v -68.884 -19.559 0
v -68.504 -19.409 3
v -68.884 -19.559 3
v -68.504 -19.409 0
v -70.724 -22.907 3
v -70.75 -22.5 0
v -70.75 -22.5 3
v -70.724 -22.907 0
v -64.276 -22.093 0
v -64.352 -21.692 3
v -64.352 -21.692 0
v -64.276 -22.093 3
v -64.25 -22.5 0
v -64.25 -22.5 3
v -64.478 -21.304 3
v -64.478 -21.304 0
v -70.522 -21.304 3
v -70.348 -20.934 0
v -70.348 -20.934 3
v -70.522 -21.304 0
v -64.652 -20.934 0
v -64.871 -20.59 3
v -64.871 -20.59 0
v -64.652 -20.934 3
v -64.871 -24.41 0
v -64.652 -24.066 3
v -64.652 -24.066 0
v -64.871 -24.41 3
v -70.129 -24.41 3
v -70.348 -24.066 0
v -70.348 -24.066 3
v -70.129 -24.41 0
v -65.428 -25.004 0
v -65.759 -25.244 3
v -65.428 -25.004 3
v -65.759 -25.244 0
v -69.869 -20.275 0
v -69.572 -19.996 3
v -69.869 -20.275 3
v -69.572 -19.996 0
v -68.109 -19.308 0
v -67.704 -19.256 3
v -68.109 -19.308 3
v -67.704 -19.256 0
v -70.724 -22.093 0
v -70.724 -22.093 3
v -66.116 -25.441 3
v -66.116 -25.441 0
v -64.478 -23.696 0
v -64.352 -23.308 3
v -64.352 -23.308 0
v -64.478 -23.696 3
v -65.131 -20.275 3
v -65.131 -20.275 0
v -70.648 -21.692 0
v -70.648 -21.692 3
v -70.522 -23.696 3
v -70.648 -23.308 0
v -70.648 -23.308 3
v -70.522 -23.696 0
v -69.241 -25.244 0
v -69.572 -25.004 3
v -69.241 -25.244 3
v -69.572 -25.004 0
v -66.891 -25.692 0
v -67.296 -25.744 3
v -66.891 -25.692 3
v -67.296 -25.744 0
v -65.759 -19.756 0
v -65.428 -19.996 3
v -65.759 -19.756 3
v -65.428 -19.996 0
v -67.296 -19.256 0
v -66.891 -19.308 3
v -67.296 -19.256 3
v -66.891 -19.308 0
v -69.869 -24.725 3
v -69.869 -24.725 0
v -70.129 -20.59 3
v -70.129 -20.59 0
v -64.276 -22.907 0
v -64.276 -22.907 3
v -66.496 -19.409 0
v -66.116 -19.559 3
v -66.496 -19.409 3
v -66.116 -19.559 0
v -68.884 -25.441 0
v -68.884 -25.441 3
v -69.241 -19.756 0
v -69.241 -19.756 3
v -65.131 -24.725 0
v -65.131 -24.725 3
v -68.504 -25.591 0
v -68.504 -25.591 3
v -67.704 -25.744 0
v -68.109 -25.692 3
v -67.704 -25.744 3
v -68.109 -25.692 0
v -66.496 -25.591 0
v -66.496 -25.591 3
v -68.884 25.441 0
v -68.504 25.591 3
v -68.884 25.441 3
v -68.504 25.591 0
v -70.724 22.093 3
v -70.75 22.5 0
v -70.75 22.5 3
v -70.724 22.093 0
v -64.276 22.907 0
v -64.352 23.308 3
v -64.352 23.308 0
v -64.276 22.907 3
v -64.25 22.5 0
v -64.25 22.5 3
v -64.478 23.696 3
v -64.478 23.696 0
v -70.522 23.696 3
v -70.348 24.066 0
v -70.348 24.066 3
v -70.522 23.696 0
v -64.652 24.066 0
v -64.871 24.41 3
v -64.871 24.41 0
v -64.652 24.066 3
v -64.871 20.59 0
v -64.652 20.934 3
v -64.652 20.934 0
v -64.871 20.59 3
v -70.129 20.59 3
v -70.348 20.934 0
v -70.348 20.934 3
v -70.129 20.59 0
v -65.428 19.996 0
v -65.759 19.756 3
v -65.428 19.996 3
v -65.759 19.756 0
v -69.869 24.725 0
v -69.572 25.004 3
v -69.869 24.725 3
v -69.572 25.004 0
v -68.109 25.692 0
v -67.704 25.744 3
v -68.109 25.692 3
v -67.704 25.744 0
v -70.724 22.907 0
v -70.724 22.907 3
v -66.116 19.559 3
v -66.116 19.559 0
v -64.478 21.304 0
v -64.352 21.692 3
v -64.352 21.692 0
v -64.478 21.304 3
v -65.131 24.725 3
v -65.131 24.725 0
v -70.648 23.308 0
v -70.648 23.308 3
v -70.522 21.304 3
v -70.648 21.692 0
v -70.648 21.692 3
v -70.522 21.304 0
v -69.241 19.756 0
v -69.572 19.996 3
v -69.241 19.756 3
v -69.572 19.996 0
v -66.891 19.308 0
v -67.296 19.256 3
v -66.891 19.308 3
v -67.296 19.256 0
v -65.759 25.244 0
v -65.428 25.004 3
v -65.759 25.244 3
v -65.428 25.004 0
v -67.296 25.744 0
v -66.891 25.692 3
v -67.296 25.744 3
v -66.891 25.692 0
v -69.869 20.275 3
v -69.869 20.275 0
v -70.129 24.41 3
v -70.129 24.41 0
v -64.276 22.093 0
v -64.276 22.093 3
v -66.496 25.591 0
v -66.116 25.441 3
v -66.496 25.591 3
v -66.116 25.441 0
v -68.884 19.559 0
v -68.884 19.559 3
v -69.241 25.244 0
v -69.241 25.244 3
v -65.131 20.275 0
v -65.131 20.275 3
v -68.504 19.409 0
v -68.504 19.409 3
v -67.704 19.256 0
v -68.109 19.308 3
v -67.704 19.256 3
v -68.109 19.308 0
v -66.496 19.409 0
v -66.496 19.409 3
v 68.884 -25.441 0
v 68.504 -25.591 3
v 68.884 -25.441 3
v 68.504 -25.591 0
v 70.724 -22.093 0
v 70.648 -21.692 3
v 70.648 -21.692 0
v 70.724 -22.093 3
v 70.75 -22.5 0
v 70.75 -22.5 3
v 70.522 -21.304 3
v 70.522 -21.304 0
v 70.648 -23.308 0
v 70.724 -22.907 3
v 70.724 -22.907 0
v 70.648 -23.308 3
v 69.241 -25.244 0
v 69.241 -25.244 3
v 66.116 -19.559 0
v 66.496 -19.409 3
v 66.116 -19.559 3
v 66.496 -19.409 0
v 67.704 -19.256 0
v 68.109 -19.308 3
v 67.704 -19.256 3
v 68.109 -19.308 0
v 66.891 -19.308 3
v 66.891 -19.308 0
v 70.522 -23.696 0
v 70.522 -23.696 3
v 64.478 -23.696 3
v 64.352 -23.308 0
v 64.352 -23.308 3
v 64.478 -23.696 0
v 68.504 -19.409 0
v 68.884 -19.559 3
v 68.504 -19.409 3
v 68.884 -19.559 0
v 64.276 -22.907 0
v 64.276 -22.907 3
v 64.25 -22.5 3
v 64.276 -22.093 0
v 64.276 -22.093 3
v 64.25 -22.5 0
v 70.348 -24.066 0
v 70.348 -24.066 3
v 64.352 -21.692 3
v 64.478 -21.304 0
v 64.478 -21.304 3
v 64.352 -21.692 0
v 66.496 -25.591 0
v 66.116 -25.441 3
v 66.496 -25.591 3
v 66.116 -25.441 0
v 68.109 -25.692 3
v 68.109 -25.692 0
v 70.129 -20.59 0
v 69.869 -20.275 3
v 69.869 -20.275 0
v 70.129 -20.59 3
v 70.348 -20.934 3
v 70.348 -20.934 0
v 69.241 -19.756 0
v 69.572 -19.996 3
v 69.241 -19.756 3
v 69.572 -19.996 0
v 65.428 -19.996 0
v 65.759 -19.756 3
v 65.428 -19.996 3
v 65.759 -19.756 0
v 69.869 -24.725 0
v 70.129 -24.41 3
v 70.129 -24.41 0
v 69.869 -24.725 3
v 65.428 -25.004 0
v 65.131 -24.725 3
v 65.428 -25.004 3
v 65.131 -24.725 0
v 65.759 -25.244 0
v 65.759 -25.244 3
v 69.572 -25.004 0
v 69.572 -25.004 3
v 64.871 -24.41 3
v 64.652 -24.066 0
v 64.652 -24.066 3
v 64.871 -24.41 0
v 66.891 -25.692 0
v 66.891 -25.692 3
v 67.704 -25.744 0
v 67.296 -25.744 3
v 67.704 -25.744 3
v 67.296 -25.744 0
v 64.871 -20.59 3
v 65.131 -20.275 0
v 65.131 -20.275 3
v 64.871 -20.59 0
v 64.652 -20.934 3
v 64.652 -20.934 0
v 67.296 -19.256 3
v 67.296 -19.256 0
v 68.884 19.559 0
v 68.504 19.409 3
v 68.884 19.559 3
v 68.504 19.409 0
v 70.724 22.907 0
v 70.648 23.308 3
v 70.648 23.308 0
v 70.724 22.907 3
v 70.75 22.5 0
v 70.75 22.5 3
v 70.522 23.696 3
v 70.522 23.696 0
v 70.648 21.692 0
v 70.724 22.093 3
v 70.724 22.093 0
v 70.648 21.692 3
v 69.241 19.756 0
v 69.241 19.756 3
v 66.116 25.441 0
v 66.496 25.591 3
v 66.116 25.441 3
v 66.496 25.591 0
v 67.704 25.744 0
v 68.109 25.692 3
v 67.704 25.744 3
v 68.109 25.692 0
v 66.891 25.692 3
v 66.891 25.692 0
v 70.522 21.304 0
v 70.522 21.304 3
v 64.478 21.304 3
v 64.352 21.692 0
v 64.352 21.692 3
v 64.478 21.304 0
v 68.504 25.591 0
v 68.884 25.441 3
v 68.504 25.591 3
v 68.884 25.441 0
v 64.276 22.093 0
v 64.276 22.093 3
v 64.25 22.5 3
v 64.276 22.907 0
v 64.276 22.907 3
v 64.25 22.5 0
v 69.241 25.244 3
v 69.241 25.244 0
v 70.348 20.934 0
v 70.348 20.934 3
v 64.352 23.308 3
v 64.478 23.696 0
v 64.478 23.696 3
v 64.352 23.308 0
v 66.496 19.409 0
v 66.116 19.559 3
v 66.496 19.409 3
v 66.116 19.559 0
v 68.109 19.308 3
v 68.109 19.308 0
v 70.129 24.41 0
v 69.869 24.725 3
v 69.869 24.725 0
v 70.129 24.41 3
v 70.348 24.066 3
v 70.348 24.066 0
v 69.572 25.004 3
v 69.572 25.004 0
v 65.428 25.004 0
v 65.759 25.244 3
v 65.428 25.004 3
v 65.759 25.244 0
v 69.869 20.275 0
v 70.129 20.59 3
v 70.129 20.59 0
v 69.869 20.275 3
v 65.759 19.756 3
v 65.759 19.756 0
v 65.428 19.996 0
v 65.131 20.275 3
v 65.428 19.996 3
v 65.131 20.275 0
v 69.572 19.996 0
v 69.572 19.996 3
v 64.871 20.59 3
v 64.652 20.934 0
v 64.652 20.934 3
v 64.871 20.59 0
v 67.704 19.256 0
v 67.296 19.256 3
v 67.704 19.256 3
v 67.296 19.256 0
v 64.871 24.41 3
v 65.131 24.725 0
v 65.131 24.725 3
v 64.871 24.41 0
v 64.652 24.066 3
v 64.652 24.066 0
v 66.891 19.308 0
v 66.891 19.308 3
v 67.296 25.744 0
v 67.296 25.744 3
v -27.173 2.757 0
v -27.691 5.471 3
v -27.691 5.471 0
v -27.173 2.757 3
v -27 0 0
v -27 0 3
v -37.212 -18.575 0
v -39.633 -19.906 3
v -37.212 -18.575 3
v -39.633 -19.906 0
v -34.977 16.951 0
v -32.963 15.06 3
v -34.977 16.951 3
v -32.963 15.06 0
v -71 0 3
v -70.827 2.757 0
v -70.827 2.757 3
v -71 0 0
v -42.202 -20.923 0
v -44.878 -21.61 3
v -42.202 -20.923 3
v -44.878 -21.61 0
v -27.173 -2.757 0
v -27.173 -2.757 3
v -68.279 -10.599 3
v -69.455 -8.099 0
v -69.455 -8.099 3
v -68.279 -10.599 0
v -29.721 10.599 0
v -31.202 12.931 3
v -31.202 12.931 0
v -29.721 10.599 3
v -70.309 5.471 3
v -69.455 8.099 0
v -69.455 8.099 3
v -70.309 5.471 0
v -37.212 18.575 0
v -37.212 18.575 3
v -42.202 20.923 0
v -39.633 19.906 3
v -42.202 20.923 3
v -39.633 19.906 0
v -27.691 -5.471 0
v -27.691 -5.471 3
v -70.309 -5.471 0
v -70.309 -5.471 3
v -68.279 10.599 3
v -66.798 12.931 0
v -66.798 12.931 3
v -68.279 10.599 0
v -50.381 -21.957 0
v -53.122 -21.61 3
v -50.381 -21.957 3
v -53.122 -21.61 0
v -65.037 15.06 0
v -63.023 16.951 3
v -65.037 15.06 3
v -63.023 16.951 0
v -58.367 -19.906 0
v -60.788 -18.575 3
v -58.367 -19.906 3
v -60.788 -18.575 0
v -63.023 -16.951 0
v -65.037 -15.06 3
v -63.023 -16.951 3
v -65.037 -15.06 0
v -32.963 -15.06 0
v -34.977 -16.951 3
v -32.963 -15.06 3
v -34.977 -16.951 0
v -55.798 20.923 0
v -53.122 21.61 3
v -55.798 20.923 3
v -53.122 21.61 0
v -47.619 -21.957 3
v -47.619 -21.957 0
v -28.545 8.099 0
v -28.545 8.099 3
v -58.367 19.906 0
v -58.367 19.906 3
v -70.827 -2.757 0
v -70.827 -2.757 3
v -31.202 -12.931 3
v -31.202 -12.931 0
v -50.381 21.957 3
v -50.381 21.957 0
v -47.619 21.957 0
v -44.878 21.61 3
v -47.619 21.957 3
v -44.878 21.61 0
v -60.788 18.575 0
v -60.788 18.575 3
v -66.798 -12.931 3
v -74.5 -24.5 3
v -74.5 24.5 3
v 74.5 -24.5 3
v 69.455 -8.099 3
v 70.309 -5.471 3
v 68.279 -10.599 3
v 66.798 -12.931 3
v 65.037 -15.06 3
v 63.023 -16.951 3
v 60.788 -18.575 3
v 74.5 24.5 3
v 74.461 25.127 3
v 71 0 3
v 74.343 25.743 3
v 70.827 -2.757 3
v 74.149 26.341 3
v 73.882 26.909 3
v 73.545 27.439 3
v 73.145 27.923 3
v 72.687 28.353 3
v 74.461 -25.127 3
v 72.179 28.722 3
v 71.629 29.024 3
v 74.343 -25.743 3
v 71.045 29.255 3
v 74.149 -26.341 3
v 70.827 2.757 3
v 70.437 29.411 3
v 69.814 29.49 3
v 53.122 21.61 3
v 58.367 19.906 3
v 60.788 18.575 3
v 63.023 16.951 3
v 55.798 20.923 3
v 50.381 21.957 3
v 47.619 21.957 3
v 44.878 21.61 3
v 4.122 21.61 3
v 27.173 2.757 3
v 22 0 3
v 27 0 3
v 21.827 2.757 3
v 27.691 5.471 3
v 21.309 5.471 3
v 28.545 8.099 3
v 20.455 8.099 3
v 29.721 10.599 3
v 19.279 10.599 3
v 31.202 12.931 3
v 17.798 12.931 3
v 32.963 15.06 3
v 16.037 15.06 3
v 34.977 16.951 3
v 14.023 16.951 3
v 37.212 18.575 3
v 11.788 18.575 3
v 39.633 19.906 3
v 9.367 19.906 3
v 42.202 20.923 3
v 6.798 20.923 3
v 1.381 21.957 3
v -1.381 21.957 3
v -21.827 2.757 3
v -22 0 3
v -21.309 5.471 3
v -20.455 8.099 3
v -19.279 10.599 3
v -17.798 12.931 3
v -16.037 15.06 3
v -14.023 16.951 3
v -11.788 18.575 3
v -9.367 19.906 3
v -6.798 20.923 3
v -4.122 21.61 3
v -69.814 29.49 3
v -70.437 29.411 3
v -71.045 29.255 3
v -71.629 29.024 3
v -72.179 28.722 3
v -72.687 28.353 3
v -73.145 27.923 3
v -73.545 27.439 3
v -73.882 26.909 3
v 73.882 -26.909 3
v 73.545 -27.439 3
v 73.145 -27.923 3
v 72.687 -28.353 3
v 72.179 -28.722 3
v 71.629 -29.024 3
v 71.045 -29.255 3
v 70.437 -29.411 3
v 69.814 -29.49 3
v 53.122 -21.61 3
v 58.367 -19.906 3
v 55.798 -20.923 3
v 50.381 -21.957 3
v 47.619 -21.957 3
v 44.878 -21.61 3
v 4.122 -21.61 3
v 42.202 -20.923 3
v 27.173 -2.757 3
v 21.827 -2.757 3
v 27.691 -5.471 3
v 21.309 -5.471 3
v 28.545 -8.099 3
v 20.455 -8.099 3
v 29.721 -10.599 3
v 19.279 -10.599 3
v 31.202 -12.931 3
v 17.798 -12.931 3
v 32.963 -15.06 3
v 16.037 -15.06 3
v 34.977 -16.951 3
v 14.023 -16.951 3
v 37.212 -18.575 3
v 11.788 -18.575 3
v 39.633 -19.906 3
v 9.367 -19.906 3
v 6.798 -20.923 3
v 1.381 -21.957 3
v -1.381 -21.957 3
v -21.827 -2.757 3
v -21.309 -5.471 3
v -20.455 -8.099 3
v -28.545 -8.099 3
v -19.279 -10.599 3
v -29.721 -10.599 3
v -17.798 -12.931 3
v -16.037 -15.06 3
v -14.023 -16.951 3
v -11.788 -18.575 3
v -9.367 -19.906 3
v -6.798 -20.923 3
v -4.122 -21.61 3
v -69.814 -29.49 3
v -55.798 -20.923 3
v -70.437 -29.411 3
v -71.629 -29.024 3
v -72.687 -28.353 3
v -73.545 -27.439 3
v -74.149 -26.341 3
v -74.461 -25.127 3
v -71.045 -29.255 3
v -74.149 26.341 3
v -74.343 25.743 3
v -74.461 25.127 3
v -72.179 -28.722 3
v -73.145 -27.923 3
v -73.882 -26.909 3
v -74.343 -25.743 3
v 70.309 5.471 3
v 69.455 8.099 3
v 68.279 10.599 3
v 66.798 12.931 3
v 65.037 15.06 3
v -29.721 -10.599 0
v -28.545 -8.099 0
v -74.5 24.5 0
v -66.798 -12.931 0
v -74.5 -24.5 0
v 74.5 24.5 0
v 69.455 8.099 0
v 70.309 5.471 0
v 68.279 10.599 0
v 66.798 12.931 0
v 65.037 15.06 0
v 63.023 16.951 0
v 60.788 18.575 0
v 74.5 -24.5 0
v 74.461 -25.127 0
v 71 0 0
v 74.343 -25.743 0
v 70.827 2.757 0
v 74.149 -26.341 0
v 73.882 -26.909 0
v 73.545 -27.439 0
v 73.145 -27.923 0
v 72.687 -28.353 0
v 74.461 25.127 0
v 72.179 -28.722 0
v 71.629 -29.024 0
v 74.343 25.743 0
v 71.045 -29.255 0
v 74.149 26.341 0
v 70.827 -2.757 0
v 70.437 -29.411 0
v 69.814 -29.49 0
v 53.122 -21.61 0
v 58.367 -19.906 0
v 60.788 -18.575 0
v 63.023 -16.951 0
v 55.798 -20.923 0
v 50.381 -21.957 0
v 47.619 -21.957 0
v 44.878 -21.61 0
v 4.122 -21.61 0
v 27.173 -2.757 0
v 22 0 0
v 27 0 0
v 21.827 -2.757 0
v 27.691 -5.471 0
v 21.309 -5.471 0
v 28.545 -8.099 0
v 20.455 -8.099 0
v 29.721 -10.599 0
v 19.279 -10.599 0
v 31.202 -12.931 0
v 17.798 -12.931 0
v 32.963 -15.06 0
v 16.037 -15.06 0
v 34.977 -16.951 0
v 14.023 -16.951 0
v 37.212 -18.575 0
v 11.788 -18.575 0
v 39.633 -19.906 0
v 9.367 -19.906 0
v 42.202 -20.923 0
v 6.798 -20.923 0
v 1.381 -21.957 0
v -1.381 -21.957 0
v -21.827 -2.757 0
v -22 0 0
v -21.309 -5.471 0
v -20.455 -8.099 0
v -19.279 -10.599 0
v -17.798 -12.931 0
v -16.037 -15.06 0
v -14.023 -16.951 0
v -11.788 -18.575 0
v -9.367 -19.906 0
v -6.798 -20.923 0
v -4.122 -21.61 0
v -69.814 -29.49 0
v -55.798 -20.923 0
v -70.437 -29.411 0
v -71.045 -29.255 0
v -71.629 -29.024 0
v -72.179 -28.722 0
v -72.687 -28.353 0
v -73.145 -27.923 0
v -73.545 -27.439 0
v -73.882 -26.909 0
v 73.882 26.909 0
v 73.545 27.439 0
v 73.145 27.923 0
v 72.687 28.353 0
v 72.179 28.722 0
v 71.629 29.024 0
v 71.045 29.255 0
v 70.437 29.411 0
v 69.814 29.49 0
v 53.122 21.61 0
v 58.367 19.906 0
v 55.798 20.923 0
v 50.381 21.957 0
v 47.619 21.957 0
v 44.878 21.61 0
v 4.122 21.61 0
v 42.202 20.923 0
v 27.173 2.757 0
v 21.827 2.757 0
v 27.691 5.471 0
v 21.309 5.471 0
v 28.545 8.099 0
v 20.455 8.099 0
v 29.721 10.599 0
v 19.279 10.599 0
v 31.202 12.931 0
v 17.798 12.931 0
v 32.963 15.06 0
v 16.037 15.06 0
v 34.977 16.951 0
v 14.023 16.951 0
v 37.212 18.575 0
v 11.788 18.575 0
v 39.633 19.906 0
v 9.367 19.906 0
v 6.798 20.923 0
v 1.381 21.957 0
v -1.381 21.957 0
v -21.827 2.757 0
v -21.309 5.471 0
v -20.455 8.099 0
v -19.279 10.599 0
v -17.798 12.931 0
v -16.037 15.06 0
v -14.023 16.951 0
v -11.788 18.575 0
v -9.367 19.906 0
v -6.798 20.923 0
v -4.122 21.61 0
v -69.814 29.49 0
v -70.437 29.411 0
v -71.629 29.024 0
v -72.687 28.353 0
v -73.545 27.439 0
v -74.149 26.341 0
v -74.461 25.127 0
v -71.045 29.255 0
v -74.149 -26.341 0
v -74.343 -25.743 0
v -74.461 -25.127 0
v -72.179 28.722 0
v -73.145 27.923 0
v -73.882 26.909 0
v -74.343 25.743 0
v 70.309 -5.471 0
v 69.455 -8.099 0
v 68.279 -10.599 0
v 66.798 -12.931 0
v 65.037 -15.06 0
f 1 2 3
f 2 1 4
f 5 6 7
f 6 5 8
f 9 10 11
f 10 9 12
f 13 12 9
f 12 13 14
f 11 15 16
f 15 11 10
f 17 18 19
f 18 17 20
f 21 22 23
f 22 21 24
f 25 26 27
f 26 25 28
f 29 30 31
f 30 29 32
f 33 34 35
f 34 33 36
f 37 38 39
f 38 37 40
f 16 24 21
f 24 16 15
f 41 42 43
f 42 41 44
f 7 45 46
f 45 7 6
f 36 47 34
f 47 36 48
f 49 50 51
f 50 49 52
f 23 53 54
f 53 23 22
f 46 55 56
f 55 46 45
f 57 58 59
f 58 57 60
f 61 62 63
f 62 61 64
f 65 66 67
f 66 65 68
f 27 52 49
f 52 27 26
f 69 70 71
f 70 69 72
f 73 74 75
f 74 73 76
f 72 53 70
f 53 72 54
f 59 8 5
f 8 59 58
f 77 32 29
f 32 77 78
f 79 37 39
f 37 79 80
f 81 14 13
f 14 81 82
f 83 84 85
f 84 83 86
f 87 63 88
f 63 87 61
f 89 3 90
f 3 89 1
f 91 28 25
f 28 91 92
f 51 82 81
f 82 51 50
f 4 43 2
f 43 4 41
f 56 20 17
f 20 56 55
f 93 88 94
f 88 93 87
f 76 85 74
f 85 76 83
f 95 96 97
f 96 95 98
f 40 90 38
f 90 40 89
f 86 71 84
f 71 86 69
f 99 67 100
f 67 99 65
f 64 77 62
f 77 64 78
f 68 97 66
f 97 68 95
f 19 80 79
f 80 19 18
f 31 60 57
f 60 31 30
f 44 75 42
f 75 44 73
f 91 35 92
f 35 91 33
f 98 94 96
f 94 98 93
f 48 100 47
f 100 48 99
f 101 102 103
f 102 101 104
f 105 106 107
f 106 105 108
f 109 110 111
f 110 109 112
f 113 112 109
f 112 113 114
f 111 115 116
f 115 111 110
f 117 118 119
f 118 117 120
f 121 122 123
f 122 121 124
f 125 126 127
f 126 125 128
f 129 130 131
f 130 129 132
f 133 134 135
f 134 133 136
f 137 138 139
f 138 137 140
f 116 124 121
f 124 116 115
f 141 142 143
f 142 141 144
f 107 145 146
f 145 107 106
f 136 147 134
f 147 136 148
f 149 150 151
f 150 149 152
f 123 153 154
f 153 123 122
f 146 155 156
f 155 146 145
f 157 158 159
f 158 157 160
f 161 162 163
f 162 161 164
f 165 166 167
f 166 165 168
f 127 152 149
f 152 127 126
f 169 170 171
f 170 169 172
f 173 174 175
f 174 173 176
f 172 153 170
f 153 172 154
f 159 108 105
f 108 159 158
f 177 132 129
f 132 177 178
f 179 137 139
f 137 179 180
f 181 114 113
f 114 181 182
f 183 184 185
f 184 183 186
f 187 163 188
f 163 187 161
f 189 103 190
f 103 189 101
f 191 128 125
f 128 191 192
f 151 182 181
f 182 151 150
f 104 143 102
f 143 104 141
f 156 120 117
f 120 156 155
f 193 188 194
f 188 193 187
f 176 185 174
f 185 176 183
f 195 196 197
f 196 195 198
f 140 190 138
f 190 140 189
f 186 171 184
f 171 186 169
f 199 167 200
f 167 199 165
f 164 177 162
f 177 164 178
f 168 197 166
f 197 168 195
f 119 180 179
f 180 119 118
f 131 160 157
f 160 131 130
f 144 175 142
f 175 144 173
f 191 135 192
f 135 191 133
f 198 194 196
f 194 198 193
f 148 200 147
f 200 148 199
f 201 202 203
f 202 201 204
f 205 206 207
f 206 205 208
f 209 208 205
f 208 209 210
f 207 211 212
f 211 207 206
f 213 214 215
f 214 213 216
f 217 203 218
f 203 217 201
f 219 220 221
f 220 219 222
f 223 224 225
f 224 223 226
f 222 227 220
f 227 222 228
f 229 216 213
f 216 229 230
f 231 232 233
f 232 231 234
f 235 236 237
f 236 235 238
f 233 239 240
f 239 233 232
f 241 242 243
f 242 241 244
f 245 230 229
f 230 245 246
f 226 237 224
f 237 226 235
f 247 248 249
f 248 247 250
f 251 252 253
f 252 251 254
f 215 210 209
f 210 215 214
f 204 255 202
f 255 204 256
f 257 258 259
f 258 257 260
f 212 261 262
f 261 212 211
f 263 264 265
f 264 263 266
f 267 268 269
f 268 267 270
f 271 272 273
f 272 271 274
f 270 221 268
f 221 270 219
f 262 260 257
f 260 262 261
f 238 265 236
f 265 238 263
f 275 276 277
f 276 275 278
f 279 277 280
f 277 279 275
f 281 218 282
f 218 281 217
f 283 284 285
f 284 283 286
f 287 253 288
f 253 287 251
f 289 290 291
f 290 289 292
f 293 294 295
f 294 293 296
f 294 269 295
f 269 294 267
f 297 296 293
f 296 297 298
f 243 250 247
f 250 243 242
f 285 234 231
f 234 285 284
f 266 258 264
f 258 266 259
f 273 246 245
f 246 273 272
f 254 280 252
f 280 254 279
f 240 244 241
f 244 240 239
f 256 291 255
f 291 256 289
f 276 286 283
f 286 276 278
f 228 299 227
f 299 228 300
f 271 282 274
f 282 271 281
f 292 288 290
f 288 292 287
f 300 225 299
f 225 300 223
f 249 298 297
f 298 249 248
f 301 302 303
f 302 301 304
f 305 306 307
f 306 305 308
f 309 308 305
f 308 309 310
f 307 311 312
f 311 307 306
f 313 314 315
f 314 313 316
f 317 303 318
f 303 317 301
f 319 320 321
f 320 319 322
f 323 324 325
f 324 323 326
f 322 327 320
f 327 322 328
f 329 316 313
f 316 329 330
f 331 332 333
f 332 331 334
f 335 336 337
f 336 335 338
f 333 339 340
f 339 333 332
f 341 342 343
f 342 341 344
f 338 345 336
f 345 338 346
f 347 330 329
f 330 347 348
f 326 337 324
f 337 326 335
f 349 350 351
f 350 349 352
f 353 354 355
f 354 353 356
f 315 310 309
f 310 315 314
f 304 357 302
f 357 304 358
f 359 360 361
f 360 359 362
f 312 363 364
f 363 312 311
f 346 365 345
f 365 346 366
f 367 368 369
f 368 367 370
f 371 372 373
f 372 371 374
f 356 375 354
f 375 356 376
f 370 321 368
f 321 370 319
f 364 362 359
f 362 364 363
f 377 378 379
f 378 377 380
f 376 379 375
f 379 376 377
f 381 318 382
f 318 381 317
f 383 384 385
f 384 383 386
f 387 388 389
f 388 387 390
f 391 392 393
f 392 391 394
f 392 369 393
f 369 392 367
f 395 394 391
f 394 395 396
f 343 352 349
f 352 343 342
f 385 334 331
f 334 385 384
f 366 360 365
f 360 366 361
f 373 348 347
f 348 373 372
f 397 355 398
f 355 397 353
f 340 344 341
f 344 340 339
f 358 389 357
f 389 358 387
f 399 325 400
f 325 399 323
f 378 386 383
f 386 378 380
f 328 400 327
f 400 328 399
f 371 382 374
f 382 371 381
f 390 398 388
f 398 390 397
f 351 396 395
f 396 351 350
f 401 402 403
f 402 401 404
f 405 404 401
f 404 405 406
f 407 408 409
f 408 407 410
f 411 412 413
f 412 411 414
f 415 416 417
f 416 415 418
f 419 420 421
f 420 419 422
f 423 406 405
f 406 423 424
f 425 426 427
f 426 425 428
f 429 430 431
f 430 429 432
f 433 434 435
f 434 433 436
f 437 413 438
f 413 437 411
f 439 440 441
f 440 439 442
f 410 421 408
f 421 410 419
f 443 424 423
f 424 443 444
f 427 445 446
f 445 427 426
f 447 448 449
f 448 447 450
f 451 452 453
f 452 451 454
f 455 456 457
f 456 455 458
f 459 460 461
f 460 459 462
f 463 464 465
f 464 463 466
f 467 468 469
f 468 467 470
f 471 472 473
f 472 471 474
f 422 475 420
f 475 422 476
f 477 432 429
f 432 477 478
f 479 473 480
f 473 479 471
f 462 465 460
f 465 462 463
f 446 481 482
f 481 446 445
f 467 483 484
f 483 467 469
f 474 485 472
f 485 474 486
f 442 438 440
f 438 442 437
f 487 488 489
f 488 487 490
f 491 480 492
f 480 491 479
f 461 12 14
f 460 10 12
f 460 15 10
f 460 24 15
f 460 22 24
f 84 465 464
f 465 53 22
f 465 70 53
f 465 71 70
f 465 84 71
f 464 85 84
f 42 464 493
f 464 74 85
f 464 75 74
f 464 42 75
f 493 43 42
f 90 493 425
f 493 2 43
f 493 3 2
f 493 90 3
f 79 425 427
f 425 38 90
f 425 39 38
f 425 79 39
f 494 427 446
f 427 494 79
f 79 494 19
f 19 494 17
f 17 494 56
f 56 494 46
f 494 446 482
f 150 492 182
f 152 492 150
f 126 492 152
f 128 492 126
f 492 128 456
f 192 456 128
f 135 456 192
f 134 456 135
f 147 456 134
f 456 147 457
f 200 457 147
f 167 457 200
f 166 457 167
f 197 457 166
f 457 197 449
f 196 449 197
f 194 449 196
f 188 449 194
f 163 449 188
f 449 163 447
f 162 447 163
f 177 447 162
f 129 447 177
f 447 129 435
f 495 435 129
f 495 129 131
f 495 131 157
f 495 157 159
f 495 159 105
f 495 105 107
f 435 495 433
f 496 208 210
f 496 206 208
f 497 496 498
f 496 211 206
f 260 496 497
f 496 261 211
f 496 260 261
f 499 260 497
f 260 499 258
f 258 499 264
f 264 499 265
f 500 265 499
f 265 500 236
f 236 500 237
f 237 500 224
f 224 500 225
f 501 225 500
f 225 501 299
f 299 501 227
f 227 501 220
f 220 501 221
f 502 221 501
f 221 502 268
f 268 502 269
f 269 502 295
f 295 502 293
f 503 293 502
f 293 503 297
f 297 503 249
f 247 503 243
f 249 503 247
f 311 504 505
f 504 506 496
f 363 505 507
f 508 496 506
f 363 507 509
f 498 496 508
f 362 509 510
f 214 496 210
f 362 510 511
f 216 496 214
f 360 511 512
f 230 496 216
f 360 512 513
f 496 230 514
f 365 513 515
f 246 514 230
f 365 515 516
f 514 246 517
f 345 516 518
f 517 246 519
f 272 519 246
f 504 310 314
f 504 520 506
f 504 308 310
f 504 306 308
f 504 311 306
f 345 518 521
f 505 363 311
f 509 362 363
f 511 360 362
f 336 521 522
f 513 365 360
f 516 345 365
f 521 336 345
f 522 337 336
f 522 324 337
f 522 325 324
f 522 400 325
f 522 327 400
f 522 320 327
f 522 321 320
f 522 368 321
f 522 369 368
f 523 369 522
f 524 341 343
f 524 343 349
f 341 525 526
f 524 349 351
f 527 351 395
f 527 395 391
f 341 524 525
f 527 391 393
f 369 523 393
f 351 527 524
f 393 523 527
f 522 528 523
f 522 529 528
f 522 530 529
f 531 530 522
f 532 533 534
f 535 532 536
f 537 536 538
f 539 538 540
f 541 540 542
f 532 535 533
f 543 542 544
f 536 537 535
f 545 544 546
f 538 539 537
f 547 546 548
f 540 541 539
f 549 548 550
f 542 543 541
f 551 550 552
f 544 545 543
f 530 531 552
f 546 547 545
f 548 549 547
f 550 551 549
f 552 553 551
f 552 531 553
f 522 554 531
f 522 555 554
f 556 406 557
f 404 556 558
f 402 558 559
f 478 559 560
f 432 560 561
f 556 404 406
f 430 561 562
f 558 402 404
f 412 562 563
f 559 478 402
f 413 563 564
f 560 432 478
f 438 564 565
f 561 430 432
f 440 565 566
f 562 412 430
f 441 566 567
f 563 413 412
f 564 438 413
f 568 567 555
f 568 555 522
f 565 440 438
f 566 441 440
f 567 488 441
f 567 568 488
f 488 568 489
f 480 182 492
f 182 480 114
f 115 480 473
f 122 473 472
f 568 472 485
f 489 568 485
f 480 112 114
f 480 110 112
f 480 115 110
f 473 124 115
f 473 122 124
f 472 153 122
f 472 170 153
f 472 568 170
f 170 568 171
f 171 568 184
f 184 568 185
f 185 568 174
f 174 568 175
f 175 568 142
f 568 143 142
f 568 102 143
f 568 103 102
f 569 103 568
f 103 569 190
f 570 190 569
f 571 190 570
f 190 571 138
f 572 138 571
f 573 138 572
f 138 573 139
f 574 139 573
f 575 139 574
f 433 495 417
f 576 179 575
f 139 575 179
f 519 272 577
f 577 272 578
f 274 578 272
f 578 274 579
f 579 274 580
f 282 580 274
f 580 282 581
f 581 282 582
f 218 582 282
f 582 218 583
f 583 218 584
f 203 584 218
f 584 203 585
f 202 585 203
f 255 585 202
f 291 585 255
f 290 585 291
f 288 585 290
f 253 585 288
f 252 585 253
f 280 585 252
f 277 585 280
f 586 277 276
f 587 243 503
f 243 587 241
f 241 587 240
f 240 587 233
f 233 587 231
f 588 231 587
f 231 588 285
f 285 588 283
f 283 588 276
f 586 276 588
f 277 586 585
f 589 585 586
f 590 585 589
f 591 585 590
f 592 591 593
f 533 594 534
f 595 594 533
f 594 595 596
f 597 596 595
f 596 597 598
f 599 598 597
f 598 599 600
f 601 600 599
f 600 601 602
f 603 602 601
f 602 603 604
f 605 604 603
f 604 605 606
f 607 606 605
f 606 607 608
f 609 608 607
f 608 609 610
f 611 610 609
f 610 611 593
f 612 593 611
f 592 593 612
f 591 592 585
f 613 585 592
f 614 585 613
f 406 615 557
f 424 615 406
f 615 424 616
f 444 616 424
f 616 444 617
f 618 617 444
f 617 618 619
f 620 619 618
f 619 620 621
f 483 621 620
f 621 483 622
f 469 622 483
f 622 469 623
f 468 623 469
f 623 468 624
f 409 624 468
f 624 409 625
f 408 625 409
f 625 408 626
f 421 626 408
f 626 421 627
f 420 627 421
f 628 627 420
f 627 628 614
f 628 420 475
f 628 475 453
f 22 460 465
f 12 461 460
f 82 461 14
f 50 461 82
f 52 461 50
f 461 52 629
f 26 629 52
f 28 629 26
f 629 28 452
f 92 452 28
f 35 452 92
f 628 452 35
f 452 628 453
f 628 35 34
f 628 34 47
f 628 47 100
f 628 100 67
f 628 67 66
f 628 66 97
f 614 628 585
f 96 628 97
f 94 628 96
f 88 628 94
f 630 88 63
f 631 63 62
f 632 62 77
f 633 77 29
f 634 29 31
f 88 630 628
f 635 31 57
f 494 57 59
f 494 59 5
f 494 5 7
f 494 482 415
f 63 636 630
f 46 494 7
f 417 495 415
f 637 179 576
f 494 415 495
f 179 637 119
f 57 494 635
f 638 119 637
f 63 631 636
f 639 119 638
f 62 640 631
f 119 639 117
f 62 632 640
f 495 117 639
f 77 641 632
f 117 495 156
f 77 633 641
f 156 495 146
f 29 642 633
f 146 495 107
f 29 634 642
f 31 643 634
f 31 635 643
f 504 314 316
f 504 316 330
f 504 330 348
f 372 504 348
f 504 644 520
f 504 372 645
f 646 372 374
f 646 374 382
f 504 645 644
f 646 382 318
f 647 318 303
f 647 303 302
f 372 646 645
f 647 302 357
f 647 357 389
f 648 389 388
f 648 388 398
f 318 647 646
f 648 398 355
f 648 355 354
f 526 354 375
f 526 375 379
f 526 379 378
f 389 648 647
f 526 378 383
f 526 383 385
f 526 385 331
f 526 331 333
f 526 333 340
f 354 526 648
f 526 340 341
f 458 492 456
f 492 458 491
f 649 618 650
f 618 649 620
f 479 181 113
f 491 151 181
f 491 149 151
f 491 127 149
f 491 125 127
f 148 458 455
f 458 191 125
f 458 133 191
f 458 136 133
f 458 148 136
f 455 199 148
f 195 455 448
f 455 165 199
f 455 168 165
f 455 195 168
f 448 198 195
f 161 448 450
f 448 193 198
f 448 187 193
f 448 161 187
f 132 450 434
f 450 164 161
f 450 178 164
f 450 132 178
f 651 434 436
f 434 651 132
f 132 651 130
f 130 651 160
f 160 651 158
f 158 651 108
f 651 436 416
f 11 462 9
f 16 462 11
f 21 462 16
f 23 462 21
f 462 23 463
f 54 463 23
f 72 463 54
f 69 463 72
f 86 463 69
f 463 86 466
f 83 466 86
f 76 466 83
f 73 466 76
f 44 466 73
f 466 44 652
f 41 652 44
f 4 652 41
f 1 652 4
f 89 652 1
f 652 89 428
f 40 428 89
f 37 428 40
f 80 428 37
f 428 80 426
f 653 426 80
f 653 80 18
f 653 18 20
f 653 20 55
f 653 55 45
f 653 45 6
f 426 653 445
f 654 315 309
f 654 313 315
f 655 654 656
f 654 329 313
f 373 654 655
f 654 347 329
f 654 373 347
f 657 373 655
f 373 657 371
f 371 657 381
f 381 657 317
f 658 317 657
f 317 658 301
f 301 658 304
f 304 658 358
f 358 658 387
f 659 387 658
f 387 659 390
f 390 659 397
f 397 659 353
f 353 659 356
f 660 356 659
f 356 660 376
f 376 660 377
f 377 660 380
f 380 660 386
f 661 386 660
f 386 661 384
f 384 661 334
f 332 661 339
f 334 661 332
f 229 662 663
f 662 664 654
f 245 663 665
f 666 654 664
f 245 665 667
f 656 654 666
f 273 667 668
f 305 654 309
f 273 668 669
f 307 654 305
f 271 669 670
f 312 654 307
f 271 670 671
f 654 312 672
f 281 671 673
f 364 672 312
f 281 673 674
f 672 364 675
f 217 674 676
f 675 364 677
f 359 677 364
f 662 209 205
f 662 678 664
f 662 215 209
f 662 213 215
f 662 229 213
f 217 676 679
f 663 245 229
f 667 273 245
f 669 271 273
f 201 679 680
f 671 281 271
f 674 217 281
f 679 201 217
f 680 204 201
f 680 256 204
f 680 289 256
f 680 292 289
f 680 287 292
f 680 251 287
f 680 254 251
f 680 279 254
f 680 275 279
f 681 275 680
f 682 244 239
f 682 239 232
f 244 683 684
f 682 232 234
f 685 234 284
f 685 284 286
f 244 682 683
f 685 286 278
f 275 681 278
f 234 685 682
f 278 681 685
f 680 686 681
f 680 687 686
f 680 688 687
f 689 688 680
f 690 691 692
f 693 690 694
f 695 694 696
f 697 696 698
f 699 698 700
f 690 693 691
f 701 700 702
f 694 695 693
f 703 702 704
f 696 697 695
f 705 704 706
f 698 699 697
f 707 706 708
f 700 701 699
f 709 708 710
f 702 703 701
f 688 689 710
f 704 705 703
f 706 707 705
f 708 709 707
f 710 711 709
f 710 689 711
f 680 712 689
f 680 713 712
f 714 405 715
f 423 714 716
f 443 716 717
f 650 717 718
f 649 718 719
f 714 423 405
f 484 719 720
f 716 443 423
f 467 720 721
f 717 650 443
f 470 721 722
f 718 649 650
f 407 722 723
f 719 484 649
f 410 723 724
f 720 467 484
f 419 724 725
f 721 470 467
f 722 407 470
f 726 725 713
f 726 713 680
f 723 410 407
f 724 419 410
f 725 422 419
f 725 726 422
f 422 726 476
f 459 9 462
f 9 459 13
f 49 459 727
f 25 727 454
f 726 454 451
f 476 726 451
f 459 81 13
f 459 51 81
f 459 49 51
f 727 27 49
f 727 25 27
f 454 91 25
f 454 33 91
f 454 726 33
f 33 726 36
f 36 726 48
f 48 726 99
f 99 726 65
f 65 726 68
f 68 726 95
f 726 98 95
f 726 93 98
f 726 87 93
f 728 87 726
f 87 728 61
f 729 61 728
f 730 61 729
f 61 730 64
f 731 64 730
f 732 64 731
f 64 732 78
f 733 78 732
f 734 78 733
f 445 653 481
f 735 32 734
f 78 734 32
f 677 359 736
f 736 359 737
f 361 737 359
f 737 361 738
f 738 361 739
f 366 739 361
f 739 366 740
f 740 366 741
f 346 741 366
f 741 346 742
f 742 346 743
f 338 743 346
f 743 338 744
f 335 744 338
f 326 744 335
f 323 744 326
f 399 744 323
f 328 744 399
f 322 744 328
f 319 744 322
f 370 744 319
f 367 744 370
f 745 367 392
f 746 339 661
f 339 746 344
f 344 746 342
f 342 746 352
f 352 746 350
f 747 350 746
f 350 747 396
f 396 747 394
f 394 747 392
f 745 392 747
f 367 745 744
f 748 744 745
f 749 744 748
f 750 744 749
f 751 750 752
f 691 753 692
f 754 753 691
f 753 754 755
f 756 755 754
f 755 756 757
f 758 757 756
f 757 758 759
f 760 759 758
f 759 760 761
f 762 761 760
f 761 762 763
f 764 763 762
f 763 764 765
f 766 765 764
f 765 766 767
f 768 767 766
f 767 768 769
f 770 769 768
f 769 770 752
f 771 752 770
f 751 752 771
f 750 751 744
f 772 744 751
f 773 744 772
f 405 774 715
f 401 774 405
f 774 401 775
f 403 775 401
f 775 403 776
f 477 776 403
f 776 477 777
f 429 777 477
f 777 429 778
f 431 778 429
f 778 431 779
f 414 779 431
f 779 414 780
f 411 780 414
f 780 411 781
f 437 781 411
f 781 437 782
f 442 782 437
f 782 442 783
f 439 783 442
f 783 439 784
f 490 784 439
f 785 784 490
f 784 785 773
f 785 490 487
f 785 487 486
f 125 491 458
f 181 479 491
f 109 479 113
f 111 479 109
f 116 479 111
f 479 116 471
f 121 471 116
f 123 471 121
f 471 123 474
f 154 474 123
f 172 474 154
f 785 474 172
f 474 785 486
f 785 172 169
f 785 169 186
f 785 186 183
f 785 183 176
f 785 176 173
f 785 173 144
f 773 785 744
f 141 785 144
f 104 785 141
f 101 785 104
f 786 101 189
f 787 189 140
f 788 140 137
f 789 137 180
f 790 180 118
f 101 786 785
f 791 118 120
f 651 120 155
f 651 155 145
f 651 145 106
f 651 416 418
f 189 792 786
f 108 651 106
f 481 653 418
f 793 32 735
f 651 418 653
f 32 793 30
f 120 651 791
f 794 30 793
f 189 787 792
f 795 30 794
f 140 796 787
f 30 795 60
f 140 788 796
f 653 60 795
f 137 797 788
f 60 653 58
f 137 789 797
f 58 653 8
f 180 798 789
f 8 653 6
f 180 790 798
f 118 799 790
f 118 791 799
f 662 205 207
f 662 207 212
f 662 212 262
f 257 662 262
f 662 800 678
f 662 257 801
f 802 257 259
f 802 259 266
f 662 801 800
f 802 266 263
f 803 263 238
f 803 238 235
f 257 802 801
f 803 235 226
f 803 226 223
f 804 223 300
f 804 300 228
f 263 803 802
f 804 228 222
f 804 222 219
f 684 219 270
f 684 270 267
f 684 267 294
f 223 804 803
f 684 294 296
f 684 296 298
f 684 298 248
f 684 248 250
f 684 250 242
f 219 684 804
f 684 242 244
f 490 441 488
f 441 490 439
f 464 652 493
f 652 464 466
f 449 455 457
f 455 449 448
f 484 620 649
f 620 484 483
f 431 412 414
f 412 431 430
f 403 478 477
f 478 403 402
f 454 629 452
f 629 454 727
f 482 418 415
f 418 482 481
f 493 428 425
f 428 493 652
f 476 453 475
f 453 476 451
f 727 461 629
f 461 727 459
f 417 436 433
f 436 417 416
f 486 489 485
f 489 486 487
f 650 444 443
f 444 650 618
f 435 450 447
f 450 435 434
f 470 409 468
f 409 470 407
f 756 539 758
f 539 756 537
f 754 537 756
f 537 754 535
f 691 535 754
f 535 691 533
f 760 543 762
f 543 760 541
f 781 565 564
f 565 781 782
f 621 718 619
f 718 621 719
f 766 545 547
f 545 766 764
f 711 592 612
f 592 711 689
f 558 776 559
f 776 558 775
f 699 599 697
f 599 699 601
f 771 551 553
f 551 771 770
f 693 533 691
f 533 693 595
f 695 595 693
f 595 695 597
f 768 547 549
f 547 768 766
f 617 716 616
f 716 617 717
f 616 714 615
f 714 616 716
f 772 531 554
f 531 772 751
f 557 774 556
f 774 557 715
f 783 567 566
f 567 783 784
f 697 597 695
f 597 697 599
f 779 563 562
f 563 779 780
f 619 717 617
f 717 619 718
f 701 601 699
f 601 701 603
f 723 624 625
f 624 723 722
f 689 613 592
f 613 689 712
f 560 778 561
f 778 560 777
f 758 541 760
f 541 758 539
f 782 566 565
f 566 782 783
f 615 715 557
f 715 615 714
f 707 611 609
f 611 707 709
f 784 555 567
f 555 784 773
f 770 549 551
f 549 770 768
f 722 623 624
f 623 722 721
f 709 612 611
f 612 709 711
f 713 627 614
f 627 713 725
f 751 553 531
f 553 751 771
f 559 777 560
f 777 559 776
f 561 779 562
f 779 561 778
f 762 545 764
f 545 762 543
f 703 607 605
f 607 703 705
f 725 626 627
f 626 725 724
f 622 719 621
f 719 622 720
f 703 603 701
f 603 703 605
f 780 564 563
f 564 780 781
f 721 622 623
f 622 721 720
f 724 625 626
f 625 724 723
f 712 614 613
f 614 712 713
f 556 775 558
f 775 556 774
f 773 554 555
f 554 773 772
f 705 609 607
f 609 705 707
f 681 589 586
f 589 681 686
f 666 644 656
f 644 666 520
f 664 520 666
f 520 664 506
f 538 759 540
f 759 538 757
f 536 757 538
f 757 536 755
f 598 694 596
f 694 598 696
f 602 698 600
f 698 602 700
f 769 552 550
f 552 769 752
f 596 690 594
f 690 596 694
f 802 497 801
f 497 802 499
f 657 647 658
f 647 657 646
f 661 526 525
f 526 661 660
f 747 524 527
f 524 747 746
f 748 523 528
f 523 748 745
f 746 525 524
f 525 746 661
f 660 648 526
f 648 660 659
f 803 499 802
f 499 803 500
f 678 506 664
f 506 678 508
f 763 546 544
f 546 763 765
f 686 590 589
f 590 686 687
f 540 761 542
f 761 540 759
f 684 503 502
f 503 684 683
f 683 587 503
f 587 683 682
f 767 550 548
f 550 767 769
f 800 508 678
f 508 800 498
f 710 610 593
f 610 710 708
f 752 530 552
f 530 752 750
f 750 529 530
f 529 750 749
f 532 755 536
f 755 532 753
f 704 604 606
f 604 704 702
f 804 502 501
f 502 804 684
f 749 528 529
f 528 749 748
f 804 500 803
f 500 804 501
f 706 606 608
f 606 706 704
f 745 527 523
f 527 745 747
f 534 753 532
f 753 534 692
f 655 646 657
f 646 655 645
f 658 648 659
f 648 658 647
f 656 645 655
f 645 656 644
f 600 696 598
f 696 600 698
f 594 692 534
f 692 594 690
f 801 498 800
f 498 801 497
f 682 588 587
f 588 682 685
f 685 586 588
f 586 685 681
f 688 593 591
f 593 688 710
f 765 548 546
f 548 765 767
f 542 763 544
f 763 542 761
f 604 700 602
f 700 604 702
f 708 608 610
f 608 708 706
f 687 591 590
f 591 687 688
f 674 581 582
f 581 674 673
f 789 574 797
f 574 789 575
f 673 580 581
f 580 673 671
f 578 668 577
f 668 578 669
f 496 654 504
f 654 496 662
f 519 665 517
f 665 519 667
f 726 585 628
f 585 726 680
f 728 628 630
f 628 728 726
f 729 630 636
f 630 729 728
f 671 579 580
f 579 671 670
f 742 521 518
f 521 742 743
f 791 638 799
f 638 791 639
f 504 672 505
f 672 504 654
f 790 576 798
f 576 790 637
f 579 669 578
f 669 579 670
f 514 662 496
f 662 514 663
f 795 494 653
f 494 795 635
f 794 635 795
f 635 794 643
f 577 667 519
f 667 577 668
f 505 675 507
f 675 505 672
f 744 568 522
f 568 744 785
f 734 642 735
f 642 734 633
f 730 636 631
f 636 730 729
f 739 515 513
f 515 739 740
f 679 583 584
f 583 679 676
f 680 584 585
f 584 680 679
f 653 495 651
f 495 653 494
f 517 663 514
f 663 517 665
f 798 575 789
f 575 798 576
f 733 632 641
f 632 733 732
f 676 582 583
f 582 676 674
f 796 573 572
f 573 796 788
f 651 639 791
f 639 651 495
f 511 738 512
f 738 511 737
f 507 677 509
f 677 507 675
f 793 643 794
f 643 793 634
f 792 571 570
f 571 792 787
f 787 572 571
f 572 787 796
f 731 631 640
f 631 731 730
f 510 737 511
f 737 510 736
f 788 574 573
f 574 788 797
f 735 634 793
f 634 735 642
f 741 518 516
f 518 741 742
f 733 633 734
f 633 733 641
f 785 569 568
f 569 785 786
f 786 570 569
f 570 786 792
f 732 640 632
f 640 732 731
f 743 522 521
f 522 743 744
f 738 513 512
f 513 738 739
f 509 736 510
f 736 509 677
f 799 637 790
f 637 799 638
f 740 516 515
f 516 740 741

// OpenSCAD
$fn = 50;

difference() {
	union() {
		hull() {
			translate(v = [-69.5, 24.5, 0]) {
				cylinder(h = 3, r = 5);
			}
			translate(v = [69.5, 24.5, 0]) {
				cylinder(h = 3, r = 5);
			}
			translate(v = [-69.5, -24.5, 0]) {
				cylinder(h = 3, r = 5);
			}
			translate(v = [69.5, -24.5, 0]) {
				cylinder(h = 3, r = 5);
			}
		}
	}
	union() {
		translate(v = [-67.5, -22.5, -100.0]) {
			cylinder(h = 200, r = 3.25);
		}
		translate(v = [-67.5, 22.5, -100.0]) {
			cylinder(h = 200, r = 3.25);
		}
		translate(v = [67.5, -22.5, -100.0]) {
			cylinder(h = 200, r = 3.25);
		}
		translate(v = [67.5, 22.5, -100.0]) {
			cylinder(h = 200, r = 3.25);
		}
		translate(v = [-67.5, -22.5, -100.0]) {
			cylinder(h = 200, r = 1.8);
		}
		translate(v = [-67.5, 22.5, -100.0]) {
			cylinder(h = 200, r = 1.8);
		}
		translate(v = [67.5, -22.5, -100.0]) {
			cylinder(h = 200, r = 1.8);
		}
		translate(v = [67.5, 22.5, -100.0]) {
			cylinder(h = 200, r = 1.8);
		}
		translate(v = [-49.0, 0, 0.0]) {
			cylinder(h = 3, r = 22.0);
		}
		cylinder(h = 3, r = 22.0);
		translate(v = [49.0, 0, 0.0]) {
			cylinder(h = 3, r = 22.0);
		}
	}
}
